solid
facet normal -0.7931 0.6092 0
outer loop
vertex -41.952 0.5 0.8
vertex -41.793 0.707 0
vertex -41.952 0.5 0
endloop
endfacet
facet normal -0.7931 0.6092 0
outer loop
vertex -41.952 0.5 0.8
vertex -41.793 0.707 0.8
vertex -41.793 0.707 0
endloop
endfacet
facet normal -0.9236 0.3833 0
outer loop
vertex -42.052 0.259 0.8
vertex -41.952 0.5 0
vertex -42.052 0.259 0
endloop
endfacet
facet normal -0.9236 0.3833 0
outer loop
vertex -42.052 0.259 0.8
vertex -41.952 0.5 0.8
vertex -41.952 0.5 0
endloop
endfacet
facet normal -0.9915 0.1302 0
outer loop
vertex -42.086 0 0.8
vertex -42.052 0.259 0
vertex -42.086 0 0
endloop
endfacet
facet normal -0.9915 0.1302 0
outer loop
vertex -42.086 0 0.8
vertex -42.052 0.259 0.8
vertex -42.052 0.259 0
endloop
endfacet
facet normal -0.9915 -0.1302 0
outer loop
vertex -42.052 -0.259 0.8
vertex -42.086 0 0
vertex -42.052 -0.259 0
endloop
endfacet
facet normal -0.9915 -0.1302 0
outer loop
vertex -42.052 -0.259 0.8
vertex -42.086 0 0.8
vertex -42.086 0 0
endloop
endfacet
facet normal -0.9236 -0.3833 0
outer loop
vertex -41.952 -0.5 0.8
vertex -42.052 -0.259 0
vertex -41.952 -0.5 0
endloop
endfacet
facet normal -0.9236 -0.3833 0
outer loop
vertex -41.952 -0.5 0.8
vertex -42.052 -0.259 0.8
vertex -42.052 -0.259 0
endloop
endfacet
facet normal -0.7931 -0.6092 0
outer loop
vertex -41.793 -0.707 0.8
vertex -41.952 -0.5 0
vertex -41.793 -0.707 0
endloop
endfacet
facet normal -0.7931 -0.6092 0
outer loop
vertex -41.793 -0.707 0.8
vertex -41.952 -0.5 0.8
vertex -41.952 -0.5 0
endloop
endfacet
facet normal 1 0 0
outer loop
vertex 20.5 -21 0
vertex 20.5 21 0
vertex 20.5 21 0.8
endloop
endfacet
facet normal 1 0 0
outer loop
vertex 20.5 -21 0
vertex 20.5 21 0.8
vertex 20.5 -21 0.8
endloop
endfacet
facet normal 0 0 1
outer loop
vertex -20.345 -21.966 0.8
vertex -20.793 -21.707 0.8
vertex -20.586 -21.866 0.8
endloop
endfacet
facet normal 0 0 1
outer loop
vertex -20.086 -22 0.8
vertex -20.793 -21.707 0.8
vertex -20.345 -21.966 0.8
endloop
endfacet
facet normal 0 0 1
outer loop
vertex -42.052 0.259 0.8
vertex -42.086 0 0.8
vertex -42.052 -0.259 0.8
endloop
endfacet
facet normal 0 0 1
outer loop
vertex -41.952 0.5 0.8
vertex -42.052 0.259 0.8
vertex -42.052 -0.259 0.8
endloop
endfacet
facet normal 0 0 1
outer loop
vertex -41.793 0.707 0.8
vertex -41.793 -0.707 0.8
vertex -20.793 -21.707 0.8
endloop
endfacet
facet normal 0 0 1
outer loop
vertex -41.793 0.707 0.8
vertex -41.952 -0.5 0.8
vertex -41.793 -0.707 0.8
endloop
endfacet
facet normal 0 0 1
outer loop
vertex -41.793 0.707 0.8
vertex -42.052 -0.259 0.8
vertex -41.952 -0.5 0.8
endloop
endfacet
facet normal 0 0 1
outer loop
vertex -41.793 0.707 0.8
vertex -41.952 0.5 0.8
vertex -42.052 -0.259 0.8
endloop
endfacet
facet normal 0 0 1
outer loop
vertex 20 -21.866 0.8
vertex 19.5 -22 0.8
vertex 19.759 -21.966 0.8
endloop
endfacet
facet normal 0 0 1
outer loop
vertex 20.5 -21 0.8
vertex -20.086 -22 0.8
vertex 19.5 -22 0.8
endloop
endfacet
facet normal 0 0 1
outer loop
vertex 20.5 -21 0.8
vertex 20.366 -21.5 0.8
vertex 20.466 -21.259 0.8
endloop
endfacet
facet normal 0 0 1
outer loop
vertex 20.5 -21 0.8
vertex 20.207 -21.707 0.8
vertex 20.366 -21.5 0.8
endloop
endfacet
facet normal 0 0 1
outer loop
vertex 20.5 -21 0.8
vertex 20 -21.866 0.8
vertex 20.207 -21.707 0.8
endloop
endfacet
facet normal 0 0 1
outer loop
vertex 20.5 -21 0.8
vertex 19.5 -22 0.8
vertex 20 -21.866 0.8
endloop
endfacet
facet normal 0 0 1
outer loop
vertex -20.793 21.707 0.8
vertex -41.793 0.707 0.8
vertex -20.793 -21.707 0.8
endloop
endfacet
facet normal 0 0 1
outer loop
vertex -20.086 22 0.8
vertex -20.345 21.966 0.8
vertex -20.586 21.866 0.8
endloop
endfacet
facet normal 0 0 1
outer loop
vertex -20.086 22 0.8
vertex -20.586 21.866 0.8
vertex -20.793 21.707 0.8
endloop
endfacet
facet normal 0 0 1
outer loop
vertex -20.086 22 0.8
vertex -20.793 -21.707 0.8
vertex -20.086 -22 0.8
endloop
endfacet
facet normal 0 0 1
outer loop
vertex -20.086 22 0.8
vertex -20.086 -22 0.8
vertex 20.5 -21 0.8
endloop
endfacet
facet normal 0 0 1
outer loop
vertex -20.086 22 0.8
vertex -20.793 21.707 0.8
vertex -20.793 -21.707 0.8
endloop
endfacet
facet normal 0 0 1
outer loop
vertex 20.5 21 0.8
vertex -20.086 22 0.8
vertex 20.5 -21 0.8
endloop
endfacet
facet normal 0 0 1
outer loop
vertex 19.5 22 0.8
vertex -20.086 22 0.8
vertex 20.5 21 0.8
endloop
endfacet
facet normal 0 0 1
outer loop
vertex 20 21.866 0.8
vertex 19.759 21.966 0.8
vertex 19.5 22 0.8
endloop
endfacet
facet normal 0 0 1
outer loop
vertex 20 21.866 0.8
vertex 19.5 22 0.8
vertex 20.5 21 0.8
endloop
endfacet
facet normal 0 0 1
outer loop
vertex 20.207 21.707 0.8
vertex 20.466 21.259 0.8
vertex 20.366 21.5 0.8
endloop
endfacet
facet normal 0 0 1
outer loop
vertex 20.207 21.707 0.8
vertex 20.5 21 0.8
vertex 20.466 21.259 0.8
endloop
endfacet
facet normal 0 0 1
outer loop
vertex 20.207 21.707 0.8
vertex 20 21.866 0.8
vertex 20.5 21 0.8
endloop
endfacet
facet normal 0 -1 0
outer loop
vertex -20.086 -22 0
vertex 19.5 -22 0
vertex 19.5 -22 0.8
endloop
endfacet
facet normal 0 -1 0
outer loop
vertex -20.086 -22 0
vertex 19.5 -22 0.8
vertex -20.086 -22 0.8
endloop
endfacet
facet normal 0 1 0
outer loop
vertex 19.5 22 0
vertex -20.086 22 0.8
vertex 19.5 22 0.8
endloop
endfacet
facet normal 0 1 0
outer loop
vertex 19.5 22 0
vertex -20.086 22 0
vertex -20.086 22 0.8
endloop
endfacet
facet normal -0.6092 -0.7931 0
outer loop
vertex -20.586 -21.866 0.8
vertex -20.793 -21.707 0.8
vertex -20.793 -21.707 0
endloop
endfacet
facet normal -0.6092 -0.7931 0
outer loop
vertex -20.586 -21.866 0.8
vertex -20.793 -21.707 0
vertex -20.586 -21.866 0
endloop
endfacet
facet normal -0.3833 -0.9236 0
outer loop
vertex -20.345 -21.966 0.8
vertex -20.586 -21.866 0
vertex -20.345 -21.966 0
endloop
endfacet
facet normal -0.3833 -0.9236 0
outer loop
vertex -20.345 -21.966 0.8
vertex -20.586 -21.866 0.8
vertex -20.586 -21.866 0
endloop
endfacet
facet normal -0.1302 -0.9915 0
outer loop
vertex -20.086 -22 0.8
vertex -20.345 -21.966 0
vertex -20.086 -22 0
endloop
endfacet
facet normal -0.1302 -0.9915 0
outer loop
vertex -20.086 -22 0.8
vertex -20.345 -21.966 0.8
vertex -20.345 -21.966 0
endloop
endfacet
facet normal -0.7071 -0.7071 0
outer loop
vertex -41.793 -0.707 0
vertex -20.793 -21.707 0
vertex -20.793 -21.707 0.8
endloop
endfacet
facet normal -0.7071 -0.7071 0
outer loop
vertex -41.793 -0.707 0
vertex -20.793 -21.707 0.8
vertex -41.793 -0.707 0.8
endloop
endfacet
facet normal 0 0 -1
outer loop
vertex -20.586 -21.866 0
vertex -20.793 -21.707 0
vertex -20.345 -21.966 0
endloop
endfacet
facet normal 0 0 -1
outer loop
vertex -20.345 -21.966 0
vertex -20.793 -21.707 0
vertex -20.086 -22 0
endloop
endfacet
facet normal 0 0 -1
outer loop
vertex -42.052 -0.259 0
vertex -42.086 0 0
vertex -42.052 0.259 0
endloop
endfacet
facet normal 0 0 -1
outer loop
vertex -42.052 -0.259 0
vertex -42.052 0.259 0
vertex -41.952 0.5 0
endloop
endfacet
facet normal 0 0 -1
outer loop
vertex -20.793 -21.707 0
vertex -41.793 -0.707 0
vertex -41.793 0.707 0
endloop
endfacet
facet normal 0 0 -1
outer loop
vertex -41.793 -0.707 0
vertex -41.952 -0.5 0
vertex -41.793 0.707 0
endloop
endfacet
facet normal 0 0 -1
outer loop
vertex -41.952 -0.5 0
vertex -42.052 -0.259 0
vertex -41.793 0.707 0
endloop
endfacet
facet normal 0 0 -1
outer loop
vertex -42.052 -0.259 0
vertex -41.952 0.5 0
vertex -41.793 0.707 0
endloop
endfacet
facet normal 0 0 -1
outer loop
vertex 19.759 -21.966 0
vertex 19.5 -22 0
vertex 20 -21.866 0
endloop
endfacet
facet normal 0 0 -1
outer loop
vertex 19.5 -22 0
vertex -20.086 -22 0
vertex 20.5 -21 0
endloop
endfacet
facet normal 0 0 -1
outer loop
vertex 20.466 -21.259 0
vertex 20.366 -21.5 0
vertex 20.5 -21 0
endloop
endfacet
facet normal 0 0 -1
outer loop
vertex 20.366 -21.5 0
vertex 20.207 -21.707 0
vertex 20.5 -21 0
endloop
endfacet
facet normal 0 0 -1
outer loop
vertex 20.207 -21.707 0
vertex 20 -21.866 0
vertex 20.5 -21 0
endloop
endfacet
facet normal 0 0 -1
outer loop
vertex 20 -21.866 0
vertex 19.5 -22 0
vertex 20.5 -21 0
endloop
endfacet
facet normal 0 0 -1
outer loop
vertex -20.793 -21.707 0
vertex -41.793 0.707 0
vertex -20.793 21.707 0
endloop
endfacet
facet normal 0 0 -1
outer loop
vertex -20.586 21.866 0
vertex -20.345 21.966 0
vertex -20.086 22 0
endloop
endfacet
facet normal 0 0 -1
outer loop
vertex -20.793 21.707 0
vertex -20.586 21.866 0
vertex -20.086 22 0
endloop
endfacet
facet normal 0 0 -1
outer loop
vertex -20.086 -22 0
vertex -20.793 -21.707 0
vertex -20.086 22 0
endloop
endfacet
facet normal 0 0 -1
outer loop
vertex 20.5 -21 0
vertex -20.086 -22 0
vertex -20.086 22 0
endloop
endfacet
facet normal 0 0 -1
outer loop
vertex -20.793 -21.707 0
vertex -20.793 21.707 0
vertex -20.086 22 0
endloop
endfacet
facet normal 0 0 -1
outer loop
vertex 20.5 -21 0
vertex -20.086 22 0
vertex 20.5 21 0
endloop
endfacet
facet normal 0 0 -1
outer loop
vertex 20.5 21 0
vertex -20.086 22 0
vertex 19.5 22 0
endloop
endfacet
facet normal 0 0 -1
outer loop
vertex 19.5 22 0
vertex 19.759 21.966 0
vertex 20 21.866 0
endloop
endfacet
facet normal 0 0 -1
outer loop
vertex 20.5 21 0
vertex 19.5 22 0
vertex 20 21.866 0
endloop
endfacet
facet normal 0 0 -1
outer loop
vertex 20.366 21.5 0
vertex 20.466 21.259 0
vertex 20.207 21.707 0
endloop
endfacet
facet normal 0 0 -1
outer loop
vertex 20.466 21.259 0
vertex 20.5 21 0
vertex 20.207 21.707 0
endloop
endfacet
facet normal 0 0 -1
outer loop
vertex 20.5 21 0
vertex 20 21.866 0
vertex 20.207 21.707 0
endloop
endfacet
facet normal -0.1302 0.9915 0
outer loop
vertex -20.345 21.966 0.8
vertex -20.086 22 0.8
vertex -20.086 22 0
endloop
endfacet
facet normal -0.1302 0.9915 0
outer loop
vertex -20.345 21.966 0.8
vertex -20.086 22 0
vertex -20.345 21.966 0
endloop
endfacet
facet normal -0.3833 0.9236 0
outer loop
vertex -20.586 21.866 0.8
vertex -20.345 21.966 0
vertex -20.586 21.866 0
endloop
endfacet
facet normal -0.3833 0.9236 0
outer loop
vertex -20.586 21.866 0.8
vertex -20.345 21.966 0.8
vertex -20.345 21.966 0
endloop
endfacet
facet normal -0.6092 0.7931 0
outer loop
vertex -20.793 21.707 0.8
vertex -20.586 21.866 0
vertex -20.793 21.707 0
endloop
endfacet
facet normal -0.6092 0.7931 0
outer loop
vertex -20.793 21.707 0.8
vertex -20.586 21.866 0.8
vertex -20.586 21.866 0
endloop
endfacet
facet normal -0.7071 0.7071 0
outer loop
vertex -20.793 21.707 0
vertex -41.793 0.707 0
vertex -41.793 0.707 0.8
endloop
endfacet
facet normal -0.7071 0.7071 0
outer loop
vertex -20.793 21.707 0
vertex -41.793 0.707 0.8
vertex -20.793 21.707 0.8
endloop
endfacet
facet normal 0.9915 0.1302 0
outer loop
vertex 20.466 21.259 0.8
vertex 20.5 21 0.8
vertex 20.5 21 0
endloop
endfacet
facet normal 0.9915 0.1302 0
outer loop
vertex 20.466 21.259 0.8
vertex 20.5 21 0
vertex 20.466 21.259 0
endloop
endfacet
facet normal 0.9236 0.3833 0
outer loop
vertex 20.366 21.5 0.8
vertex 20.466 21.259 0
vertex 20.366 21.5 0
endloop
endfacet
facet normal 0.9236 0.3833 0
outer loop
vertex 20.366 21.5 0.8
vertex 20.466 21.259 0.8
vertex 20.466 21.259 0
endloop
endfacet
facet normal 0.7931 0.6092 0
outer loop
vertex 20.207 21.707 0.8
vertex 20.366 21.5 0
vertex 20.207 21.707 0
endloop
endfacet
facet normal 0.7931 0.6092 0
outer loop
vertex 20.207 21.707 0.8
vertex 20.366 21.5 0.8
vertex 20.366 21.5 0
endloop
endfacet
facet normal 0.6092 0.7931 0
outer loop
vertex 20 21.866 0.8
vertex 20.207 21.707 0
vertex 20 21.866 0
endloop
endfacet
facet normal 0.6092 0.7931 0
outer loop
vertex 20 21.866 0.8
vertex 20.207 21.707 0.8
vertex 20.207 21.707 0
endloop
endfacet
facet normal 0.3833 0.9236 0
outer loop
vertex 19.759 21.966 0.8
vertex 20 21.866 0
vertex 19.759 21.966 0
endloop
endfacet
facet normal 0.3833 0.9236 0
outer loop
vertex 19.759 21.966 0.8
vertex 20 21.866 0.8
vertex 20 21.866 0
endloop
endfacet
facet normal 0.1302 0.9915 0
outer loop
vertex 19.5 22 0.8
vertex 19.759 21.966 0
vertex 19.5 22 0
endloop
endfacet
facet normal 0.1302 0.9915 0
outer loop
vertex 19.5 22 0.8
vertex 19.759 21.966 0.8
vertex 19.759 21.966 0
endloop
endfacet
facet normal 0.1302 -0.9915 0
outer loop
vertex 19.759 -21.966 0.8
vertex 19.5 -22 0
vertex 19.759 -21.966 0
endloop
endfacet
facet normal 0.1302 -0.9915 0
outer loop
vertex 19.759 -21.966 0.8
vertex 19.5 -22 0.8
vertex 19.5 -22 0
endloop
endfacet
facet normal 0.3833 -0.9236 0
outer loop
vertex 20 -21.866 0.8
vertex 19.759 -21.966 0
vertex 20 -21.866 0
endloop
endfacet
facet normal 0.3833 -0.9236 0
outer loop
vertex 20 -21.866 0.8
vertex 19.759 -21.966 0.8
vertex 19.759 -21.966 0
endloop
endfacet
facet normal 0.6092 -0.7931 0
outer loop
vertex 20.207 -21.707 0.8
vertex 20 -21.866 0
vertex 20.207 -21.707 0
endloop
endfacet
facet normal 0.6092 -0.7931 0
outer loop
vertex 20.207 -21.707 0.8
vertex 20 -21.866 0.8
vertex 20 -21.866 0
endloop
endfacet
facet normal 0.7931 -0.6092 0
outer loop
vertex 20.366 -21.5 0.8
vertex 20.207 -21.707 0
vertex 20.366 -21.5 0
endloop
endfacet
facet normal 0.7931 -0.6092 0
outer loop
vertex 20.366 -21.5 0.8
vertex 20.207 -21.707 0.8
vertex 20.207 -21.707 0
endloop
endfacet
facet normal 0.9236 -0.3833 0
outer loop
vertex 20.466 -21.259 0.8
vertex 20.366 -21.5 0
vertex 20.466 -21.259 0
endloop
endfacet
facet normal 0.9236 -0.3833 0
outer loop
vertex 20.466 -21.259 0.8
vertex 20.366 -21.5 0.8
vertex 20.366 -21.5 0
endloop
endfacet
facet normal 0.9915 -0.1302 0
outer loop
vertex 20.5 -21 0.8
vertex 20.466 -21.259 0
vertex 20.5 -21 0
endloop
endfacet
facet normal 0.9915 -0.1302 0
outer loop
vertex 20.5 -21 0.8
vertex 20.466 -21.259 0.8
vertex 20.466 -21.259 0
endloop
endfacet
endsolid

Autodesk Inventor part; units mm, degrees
ref_plane "YZ Plane" through (0, 0, 0) normal (1, 0, 0) x (0, 1, 0)
ref_plane "XZ Plane" through (0, 0, 0) normal (0, 1, 0) x (-1, 0, 0)
ref_plane "XY Plane" through (0, 0, 0) normal (0, 0, 1) x (1, 0, 0)
sketch "Sketch1" plane through (0, 0, 0) normal (0, 0, 1) x (1, 0, 0)
  line L0 (-20.5, 22) -> (20.5, 22)
  line L1 (20.5, 22) -> (20.5, -22)
  line L2 (20.5, -22) -> (-20.5, -22)
  line L3 (-20.5, -22) -> (-20.5, 22) construction
  line L4 (-20.5, 22) -> (20.5, -22) construction
  line L5 (-20.5, -22) -> (-42.5, 0)
  line L6 (-42.5, 0) -> (-20.5, 22)
  point P0 (0, 0)
  point P1 (0, 0)
  point P2 (20.5, 0)
  dimension "d0" = 41
  dimension "d1" = 44
  dimension "d4" = 63
extrude "Plate1" add sketch "Sketch1" along normal blind 0.8
fillet "Corner Round2" radius 1 5 edges at (-20.5, -22, 0.4) (-42.5, 0, 0.4) (-20.5, 22, 0.4) (20.5, -22, 0.4) (20.5, 22, 0.4)
equation "\"d2\" = Thickness"
equation "\"BendReliefWidth\" = Thickness"
equation "\"BendReliefDepth\" = 0.5 * Thickness"
equation "\"CornerReliefSize\" = 4 * Thickness"
equation "\"MinimumRemnant\" = 2 * Thickness"
equation "\"TransitionRadius\" = BendRadius"
equation "\"JacobiRadiusSize\" = BendRadius"
equation "\"GapSize\" = Thickness"
equation "\"Thickness\" = 0.8"
equation "\"BendRadius\" = 2.75"
properties part number "MNT-CDF-604 CAP" material "Stainless Steel"
